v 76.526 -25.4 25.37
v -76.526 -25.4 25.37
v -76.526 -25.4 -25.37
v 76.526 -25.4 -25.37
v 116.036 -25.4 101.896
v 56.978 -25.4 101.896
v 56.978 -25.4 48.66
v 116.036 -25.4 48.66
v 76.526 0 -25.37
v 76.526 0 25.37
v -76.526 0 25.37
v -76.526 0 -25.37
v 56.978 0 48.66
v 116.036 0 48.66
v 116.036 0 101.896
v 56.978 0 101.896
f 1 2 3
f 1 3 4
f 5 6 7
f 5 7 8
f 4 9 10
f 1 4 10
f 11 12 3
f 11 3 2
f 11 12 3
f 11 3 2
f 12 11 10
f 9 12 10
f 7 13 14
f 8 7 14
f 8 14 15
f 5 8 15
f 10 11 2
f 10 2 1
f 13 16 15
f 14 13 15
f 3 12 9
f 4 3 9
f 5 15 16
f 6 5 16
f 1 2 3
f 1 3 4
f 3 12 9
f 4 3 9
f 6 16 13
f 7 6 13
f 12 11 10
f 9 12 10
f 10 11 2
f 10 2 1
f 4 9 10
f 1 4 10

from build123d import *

# Parameters (mm, degrees)
F0_W     = 153.0516147614
F0_H     = 50.7399439812
F2_DEPTH = 25.4
F1_W     = 153.0516147614
F1_H     = 50.7399439812


with BuildPart() as f2:
    # F0 (on Front) → F2 (new body)
    with BuildSketch(Plane.XZ):
        Rectangle(F0_W, F0_H)
    extrude(amount=F2_DEPTH)


with BuildPart() as f2b:
    # F0 (on Front) → F2, piece 2 (new body)
    with BuildSketch(Plane.XZ):
        with BuildLine():
            Line((76.5258073807, 63.2169768214), (76.5258073807, 48.6604385078))
            Line((76.5258073807, 48.6604385078), (116.0364151001, 48.6604385078))
            Line((116.0364151001, 48.6604385078), (99.4003713131, 64.4646808505))
            ThreePointArc((99.4003713131, 64.4646808505), (87.372338283, 74.6712603045), (76.5258073807, 63.2169768214))
        make_face()
        with BuildLine():
            Line((56.9784641266, 48.6604385078), (76.5258073807, 48.6604385078))
            Line((76.5258073807, 48.6604385078), (76.5258073807, 63.2169768214))
            ThreePointArc((76.5258073807, 63.2169768214), (87.372338283, 74.6712603045), (99.4003713131, 64.4646808505))
            Line((99.4003713131, 64.4646808505), (116.0364151001, 48.6604385078))
            Line((116.0364151001, 48.6604385078), (116.0364151001, 101.8957830966))
            Line((116.0364151001, 101.8957830966), (56.9784641266, 101.8957830966))
            Line((56.9784641266, 101.8957830966), (56.9784641266, 48.6604385078))
        make_face()
    extrude(amount=F2_DEPTH)


with BuildPart() as f2c:
    # F1 (on face) → F2, piece 3 (new body)
    with BuildSketch(Plane.XZ):
        Rectangle(F1_W, F1_H)
    extrude(amount=F2_DEPTH)


solid = Compound([f2.part, f2b.part, f2c.part])
